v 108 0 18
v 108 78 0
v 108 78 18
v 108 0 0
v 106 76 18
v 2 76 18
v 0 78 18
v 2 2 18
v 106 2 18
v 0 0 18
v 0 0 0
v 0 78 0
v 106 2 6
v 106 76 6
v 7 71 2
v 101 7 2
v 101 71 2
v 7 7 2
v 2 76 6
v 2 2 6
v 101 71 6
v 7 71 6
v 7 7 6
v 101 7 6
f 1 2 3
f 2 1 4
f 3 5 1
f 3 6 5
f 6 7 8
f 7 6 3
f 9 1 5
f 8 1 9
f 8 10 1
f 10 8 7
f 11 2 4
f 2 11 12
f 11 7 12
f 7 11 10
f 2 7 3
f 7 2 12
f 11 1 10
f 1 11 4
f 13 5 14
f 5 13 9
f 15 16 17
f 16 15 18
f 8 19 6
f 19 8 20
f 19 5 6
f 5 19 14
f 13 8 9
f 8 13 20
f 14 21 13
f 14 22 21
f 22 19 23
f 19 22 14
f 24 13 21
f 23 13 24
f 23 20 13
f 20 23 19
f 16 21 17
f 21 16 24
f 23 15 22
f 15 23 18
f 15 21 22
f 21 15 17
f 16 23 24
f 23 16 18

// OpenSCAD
//*************************************************
// VARIABLES
//*************************************************

// part to generate ( 0: box ; 1: top ; 2: all )
part = 0; // [0:box,1:top,2:all]

// wall thickness
wt = 2;

// lower support (x,y,z) thickness
lss = [ 5, 5, 4 ];

// internal object x,y,z size ( must consider required margins )
is = [ 104, 74, 10 ];

// object count
oc = 1;

// top interlock margin
tim = .5;

// top grid airflow ( >0 to enable or 0 to disable )
tg = 0;

// top grid airflow wall thickness
tgwt = 5;

// hole (width, height, xcenter, xcenter_percent, zbottom)
// notes: if xcenter_percent true when pos represent position 0..1 inside
// zbottom is the distance from bottom to the begin of hole

// left holes ( array of [width, height, xcenter, xcenter_percent, zbottom] )
lh = [];

// right holes ( array of [width, height, xcenter, xcenter_percent, zbottom] )
rh = [];

// front holes ( array of [width, height, xcenter, xcenter_percent, zbottom] )
fh = [ ];

// bottom holes ( array of [width, height, xcenter, xcenter_percent, zbottom] )
bh = [];
//bh = fh;

//*************************************************
//
//*************************************************

// total size
ts = [
    wt + oc * ( is[0] + wt ),
    is[1] + 2 * wt,
    wt + lss[2] + is[2] + 2 * wt
];

someholes = (len(lh) + len(rh) + len(fh) + len(bh)) > 0;

//======================================
// part: 0 ( BOX and HOLES )
//======================================
module box()
{
    wt3 = [wt, wt, wt];
    
    // box size
    bs = [ ts[0], ts[1], ts[2] - wt ];
    
    color("DarkGray", alpha=.5)
    {
        union()
        {    

            // main box
            difference()
            {
                cube(bs);
                translate(wt3)
                    cube([ts[0] - 2 * wt, bs[1] - 2 * wt, bs[2]]);
            }
            
            // pcb support
            translate(wt3)
            {
                difference()
                {
                    cube([
                        bs[0] - 2 * wt,
                        bs[1] - 2 * wt,
                        lss[2]
                    ]);
                    translate([lss[0], lss[1], 0])
                        cube([
                            bs[0] - 2 * wt - 2 * lss[0],
                            bs[1] - 2 * wt - 2 * lss[1],
                            lss[2]
                        ]);
                }
            }
            
            // objs sep walls with lower support
            if (oc > 1)
            {
                for (i = [1:oc-1])
                {
                    // wall
                    translate([i * (wt + is[0]), 0, 0])
                        cube([wt, bs[1], wt + lss[2] + is[2]]);
                    
                    // near support
                    translate([i * (wt + is[0]) - lss[0], 0, wt])        
                        cube([lss[0], bs[1], lss[2]]);
                    
                    // far support
                    translate([i * (wt + is[0]) + wt, 0, wt])        
                        cube([lss[0], bs[1], lss[2]]);
                }
            }
        }
    }
}

module holes()
{
    // front holes
    if (len(fh) > 0)
    {
        for (i = [0 : len(fh)-1])
        {    
            hole = fh[i];        
            
            w = hole[0];
            h = hole[1];        
            
            xpos = wt + i * (is[0] + wt) + 
                (hole[3] ? is[0] * hole[2] : hole[2]) - w/2;
            zpos = hole[4];
                    
            translate([xpos, 0, zpos])
                cube([w, wt + lss[1], h]);                
        }
    }
    
    // back holes
    if (len(bh) > 0)
    {
        for (i = [0 : len(bh)-1])
        {    
            hole = bh[i];        
            
            w = hole[0];
            h = hole[1];        
            
            xpos = wt + i * (is[0] + wt) + 
                (hole[3] ? is[0] * hole[2] : hole[2]) - w/2;
            zpos = hole[4];
                    
            translate([xpos, ts[1] - wt - lss[1], zpos])
                cube([w, wt + lss[1], h]);                
        }
    }
    
    // left holes
    if (len(lh) > 0)
    {
        for (i = [0 : len(lh)-1])
        {    
            hole = lh[i];                
            
            w = hole[0];
            h = hole[1];        
            
            ypos = wt + 
                (hole[3] ? is[1] * hole[2] : hole[2]) - w/2;
            zpos = hole[4];
                    
            translate([0, ypos, zpos])
                cube([wt + lss[1], w, h]);                
        }
    }
    
    // right holes
    if (len(rh) > 0)
    {
        for (i = [0 : len(rh)-1])
        {    
            hole = rh[i];                
            
            w = hole[0];
            h = hole[1];        
            
            ypos = wt + 
                (hole[3] ? is[1] * hole[2] : hole[2]) - w/2;
            zpos = hole[4];
                    
            translate([ts[0] - wt - lss[1], ypos, zpos])
                cube([wt + lss[1], w, h]);                
        }
    }
}

if (part == 0 || part == 2)
{
    difference()
    {
        box();
        if (someholes) holes();
    }
}

//======================================
// part: 1 ( TOP )
//======================================
module topGrid()
{
    if (tg > 0)
    {                
        // avx,y space after required margin
        avx = ts[0] - 4 * wt;
        avy = ts[1] - 4 * wt;
        
        dimx = tg + tgwt;
        dimy = tg + tgwt;
                                
        kx = floor(avx / dimx);
        offx = (ts[0] - kx * dimx) / 2 + tgwt / 2;
                
        ky = floor(avy / dimy);
        offy = (ts[1] - ky * dimy) / 2 + tgwt / 2;
        
        echo(ts[0]/oc);
        
        for (ix = [0:kx-1])
        {
            for (iy = [0:ky-1])
            {                                                
                tx = offx + ix * dimx;
                ty = offy + iy * dimy;
                
                if ((tx + dimx/2) % (ts[0]/oc) > wt + dimx/2)
                {                
                    translate([tx, ty, ts[2] - 2 * wt])
                        cube([tg, tg, 2 * wt]);
                }
            }
        }
    }
}

module top_()
{
    color("Coral", alpha=.5)    
    {
        // top
        translate([0, 0, ts[2]-wt])
            cube([ts[0], ts[1], wt]);
        
        // top interlock
        translate([wt + tim, wt + tim, ts[2] - 2 * wt])
            cube([ts[0] - 2 * wt - 2 * tim, ts[1] - 2 * wt - 2 * tim, wt]);
    }
}

module top()
{
    difference()
    {
        top_();
        topGrid();
    }    
}
if (part == 1 || part == 2)
{
    top();
}
